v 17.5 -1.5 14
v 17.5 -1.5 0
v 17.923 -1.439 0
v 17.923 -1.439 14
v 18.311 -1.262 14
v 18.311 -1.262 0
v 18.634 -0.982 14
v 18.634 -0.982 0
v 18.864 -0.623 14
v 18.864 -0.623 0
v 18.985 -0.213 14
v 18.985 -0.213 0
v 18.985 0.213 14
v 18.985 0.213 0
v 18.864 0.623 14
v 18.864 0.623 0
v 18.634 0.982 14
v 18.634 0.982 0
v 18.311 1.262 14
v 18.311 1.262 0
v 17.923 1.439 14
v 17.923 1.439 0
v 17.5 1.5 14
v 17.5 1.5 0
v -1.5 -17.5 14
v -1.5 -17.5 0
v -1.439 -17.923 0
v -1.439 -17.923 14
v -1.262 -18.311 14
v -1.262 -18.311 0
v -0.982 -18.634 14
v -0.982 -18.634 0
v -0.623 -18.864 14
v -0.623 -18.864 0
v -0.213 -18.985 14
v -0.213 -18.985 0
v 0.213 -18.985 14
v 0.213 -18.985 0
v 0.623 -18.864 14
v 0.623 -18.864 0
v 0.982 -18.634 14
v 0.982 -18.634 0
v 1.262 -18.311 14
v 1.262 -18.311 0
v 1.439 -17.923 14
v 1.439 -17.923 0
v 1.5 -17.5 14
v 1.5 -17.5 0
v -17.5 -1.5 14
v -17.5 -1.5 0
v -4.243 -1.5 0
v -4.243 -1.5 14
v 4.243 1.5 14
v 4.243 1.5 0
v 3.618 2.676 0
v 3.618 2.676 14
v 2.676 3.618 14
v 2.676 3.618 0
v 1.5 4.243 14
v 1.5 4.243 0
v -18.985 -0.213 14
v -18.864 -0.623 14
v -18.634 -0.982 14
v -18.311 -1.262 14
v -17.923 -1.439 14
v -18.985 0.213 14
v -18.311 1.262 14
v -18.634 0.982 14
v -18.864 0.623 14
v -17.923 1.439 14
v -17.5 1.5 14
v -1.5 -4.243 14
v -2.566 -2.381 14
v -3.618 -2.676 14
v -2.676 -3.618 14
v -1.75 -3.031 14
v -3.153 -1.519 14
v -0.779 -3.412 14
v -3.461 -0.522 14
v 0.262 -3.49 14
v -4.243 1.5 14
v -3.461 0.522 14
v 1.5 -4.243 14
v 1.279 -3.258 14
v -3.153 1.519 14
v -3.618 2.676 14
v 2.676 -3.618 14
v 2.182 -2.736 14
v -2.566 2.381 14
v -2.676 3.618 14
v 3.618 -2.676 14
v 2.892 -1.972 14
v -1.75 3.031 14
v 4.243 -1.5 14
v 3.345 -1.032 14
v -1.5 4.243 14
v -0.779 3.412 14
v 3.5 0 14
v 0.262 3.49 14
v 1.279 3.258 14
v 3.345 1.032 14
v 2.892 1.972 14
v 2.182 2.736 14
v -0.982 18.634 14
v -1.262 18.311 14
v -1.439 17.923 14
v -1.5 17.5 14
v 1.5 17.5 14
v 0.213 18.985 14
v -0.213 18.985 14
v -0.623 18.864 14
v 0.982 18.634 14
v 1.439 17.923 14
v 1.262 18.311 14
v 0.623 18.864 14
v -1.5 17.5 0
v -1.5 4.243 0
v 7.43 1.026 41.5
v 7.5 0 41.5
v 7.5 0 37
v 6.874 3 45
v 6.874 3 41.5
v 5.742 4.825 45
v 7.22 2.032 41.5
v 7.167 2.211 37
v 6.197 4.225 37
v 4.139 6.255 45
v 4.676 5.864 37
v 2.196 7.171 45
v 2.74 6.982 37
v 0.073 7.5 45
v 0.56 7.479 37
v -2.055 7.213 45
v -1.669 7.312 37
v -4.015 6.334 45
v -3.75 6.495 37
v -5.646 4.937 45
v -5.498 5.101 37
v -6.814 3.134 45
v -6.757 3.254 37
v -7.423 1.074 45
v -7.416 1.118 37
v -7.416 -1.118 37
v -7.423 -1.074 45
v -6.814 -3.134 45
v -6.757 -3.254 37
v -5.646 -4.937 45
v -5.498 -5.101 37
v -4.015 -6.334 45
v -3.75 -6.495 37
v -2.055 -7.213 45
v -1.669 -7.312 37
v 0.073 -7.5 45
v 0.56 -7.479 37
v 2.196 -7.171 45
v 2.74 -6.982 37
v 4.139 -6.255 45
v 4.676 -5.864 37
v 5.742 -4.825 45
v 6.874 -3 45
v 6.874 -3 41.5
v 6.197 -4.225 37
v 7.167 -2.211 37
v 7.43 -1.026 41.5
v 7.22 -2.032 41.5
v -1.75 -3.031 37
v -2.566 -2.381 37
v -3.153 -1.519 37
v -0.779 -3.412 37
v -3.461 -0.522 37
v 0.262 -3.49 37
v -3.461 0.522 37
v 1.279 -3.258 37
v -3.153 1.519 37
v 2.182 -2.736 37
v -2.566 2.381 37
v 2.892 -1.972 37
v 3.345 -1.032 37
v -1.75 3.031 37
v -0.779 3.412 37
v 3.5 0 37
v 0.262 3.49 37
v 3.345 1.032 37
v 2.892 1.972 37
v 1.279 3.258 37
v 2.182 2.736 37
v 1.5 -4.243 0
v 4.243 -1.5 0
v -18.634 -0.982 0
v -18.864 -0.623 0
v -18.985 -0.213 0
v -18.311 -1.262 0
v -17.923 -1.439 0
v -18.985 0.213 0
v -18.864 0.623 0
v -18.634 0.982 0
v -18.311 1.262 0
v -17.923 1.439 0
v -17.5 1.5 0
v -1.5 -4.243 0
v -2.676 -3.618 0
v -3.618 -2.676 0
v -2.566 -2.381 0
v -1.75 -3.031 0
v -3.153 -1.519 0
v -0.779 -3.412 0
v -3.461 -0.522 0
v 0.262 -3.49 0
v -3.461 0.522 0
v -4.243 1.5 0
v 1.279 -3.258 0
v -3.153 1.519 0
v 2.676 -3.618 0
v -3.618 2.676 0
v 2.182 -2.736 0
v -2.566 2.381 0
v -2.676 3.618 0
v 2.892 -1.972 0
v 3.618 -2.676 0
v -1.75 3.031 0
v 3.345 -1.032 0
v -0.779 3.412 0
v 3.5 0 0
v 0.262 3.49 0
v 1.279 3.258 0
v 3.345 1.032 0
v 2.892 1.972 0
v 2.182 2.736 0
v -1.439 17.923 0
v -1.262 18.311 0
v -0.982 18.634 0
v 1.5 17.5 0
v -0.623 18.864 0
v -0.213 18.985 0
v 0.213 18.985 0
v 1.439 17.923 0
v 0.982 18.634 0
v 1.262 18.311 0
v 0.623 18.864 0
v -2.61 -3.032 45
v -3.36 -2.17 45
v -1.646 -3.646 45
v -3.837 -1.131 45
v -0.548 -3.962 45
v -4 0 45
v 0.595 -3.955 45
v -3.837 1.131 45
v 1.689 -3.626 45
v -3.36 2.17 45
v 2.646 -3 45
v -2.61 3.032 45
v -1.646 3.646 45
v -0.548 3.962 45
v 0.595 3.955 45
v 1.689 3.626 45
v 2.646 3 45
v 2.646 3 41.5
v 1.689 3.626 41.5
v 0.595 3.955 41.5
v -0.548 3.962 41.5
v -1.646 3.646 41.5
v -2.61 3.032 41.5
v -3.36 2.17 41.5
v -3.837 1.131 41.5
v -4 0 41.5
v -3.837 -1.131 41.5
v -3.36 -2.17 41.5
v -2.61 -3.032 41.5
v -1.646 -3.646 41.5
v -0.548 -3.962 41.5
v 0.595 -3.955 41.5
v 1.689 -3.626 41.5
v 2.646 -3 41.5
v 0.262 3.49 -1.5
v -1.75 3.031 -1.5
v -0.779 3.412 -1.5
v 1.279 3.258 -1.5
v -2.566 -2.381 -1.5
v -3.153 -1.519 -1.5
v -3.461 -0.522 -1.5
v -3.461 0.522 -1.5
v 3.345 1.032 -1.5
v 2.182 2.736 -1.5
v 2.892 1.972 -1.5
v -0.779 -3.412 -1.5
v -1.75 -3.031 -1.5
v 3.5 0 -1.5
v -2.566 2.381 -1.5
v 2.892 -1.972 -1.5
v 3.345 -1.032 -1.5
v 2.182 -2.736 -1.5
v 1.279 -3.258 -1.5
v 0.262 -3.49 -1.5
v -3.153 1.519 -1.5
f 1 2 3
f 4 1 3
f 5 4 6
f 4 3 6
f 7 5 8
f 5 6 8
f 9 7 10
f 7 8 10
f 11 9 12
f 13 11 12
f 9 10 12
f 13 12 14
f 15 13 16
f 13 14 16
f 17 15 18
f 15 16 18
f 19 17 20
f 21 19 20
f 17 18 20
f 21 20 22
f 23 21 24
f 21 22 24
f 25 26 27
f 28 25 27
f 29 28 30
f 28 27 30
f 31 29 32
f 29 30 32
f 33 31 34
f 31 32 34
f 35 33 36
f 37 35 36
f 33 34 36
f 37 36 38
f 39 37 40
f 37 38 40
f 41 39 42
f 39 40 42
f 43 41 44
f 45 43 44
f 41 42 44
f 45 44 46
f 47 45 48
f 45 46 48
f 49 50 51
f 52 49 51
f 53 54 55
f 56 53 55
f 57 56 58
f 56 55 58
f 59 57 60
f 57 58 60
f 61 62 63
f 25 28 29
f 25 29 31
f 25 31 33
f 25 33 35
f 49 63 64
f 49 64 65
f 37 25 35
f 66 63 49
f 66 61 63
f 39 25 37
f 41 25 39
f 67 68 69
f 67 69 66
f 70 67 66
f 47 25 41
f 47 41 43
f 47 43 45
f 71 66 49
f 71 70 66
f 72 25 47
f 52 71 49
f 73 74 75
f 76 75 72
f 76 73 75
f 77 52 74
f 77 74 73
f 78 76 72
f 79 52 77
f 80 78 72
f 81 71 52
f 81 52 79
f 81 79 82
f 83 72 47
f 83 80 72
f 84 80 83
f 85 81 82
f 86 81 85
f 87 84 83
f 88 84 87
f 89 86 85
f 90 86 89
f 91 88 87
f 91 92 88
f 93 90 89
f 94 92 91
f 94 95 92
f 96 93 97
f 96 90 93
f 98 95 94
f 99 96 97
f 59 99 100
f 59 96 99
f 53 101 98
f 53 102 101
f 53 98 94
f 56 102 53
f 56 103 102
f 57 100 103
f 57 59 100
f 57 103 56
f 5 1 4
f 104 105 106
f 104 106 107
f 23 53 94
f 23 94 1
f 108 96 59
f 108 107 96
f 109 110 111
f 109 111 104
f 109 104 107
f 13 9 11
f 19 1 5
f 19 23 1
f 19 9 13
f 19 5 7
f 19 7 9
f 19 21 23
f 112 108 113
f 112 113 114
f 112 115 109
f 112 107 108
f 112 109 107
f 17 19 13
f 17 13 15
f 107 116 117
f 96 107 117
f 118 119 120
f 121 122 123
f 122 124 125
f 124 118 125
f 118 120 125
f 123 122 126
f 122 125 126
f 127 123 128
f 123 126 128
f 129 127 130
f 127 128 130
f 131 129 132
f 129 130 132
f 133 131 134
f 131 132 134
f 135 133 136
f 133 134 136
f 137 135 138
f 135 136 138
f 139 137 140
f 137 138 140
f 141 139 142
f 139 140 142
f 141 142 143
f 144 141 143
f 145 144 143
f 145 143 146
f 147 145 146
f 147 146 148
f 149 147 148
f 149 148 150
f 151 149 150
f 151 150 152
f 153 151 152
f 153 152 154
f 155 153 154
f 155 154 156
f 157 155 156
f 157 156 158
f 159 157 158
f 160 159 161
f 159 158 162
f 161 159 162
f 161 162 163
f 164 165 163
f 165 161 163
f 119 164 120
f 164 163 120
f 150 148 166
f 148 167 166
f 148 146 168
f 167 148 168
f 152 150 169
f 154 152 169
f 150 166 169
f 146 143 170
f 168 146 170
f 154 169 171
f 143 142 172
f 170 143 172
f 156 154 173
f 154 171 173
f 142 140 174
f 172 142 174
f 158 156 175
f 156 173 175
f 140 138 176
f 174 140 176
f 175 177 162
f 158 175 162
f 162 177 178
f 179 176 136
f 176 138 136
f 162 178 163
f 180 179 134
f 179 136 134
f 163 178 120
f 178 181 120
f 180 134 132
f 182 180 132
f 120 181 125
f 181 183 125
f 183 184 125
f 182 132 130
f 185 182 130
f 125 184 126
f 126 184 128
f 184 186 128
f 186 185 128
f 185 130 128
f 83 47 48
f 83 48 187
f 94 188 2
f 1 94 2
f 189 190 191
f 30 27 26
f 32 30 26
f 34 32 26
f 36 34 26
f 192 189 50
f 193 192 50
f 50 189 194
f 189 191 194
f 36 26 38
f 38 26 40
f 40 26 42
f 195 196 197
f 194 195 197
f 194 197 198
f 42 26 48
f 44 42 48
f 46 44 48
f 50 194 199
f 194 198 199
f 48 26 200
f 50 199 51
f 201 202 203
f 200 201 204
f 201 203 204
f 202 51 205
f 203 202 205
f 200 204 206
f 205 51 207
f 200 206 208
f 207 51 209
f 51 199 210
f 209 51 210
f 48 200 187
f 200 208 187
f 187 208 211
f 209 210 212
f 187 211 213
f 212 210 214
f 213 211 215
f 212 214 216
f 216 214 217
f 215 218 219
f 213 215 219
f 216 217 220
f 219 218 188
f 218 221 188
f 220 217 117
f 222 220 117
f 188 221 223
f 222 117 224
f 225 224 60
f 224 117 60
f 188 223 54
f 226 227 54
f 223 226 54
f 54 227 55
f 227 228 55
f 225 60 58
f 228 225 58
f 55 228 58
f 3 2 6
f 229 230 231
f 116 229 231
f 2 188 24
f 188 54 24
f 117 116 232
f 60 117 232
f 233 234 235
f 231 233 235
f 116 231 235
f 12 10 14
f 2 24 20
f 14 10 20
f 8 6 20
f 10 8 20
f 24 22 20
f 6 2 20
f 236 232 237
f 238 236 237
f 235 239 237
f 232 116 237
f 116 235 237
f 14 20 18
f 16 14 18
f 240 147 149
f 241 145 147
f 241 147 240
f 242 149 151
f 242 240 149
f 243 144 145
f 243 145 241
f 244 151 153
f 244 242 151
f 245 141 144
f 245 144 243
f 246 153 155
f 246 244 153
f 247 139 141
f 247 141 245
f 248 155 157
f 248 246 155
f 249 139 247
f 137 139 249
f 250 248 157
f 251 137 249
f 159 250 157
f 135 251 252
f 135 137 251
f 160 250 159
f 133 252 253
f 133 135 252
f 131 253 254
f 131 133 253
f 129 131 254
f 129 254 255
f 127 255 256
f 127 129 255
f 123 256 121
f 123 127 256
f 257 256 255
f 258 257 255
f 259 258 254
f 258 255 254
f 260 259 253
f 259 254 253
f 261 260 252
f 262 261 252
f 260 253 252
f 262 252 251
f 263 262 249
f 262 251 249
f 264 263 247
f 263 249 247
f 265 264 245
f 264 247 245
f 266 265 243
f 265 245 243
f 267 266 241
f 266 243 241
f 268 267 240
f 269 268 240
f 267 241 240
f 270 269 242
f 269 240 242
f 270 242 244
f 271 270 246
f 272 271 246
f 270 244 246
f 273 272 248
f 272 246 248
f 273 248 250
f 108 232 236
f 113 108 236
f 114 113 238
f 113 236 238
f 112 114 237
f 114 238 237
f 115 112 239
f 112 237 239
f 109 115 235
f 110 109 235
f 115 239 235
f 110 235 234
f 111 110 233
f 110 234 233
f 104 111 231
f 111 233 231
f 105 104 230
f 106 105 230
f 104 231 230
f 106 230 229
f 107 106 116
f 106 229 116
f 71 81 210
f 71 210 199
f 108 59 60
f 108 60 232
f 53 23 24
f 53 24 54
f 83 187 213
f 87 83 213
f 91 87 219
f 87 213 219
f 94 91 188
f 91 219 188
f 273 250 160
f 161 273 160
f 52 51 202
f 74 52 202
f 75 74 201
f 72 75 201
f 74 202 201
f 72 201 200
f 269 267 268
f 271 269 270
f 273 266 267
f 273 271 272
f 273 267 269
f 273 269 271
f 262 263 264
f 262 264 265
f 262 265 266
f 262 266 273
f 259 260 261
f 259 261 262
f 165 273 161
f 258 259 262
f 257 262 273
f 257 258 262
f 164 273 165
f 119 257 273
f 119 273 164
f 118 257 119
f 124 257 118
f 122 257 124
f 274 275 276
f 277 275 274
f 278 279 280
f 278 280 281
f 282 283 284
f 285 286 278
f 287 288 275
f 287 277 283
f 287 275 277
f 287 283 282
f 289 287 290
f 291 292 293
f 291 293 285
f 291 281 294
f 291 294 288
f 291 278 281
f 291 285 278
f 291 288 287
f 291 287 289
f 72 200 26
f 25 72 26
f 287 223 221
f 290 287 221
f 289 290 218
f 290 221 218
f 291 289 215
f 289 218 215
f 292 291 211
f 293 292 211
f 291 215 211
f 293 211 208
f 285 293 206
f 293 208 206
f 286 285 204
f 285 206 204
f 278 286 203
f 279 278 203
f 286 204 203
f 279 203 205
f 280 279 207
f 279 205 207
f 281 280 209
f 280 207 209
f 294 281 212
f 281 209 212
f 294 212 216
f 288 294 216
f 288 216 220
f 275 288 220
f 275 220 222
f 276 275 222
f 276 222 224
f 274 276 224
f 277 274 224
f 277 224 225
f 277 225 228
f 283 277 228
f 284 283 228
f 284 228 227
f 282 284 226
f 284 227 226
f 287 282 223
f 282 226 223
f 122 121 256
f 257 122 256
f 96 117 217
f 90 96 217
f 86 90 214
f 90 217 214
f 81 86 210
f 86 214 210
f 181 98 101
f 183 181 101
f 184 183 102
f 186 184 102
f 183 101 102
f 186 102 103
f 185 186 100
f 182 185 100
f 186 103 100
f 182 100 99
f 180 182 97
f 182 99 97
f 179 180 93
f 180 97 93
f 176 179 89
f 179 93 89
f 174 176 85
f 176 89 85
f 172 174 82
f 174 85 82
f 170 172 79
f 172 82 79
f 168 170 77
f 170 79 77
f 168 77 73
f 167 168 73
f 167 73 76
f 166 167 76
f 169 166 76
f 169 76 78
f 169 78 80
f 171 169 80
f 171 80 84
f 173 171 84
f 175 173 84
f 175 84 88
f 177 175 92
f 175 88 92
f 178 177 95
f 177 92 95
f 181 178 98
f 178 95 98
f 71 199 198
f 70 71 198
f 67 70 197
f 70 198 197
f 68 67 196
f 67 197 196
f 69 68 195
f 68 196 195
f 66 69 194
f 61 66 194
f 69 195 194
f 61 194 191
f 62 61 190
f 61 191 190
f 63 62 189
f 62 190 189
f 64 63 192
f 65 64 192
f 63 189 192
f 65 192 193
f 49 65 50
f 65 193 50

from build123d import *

# Parameters (mm, degrees)
SKETCH003_R        = 4.5
PAD001_DEPTH       = 14
POLARPATTERN_COUNT = 4
SKETCH004_R        = 3.5
PAD002_DEPTH       = 1.5
SKETCH005_R        = 3.5
PAD003_DEPTH       = 23
SKETCH011_R        = 7.5
PAD007_DEPTH       = 8
POCKET004_DEPTH    = 3.5


with BuildPart() as part:
    # Sketch003 → Pad001 (new body)
    with BuildSketch(Plane.XY):
        Circle(SKETCH003_R)
        with BuildLine():
            Line((-1.5, 17.5), (-1.5, -17.5))
            ThreePointArc((-1.5, -17.5), (0, -19), (1.5, -17.5))
            Line((1.5, -17.5), (1.5, 17.5))
            ThreePointArc((1.5, 17.5), (0, 19), (-1.5, 17.5))
        make_face()
    pad001 = extrude(amount=PAD001_DEPTH)

    # PolarPattern: Pad001 ×4 about axis
    polarpattern_axis = Axis((0, 0, 0), (0, 0, 1))
    for i in range(1, POLARPATTERN_COUNT):
        add(pad001.rotate(polarpattern_axis, i * 360 / POLARPATTERN_COUNT))

    # Sketch004 (on Face17 of MultiTransform) → Pad002 (join)
    with BuildSketch(Plane(origin=(0, 0, 0), x_dir=(1, 0, 0), z_dir=(0, 0, -1))):
        Circle(SKETCH004_R)
    extrude(amount=PAD002_DEPTH)

    # Sketch005 (on Face4 of Pad002) → Pad003 (join)
    with BuildSketch(Plane.XY.offset(14)):
        Circle(SKETCH005_R)
    extrude(amount=PAD003_DEPTH)

    # Sketch011 (on Face22 of Pad003) → Pad007 (join)
    with BuildSketch(Plane.XY.offset(37)):
        Circle(SKETCH011_R)
    extrude(amount=PAD007_DEPTH)

    # Sketch012 (on Face24 of Pad007) → Pocket004 (cut)
    with BuildSketch(Plane.XY.offset(45)):
        with BuildLine():
            ThreePointArc((2.645751, 3), (-4, 0), (2.645751, -3))
            Line((2.645751, -3), (10.145751, -3))
            Line((10.145751, -3), (10.145751, 3))
            Line((10.145751, 3), (2.645751, 3))
        make_face()
    extrude(amount=-POCKET004_DEPTH, mode=Mode.SUBTRACT)


solid = part.part
